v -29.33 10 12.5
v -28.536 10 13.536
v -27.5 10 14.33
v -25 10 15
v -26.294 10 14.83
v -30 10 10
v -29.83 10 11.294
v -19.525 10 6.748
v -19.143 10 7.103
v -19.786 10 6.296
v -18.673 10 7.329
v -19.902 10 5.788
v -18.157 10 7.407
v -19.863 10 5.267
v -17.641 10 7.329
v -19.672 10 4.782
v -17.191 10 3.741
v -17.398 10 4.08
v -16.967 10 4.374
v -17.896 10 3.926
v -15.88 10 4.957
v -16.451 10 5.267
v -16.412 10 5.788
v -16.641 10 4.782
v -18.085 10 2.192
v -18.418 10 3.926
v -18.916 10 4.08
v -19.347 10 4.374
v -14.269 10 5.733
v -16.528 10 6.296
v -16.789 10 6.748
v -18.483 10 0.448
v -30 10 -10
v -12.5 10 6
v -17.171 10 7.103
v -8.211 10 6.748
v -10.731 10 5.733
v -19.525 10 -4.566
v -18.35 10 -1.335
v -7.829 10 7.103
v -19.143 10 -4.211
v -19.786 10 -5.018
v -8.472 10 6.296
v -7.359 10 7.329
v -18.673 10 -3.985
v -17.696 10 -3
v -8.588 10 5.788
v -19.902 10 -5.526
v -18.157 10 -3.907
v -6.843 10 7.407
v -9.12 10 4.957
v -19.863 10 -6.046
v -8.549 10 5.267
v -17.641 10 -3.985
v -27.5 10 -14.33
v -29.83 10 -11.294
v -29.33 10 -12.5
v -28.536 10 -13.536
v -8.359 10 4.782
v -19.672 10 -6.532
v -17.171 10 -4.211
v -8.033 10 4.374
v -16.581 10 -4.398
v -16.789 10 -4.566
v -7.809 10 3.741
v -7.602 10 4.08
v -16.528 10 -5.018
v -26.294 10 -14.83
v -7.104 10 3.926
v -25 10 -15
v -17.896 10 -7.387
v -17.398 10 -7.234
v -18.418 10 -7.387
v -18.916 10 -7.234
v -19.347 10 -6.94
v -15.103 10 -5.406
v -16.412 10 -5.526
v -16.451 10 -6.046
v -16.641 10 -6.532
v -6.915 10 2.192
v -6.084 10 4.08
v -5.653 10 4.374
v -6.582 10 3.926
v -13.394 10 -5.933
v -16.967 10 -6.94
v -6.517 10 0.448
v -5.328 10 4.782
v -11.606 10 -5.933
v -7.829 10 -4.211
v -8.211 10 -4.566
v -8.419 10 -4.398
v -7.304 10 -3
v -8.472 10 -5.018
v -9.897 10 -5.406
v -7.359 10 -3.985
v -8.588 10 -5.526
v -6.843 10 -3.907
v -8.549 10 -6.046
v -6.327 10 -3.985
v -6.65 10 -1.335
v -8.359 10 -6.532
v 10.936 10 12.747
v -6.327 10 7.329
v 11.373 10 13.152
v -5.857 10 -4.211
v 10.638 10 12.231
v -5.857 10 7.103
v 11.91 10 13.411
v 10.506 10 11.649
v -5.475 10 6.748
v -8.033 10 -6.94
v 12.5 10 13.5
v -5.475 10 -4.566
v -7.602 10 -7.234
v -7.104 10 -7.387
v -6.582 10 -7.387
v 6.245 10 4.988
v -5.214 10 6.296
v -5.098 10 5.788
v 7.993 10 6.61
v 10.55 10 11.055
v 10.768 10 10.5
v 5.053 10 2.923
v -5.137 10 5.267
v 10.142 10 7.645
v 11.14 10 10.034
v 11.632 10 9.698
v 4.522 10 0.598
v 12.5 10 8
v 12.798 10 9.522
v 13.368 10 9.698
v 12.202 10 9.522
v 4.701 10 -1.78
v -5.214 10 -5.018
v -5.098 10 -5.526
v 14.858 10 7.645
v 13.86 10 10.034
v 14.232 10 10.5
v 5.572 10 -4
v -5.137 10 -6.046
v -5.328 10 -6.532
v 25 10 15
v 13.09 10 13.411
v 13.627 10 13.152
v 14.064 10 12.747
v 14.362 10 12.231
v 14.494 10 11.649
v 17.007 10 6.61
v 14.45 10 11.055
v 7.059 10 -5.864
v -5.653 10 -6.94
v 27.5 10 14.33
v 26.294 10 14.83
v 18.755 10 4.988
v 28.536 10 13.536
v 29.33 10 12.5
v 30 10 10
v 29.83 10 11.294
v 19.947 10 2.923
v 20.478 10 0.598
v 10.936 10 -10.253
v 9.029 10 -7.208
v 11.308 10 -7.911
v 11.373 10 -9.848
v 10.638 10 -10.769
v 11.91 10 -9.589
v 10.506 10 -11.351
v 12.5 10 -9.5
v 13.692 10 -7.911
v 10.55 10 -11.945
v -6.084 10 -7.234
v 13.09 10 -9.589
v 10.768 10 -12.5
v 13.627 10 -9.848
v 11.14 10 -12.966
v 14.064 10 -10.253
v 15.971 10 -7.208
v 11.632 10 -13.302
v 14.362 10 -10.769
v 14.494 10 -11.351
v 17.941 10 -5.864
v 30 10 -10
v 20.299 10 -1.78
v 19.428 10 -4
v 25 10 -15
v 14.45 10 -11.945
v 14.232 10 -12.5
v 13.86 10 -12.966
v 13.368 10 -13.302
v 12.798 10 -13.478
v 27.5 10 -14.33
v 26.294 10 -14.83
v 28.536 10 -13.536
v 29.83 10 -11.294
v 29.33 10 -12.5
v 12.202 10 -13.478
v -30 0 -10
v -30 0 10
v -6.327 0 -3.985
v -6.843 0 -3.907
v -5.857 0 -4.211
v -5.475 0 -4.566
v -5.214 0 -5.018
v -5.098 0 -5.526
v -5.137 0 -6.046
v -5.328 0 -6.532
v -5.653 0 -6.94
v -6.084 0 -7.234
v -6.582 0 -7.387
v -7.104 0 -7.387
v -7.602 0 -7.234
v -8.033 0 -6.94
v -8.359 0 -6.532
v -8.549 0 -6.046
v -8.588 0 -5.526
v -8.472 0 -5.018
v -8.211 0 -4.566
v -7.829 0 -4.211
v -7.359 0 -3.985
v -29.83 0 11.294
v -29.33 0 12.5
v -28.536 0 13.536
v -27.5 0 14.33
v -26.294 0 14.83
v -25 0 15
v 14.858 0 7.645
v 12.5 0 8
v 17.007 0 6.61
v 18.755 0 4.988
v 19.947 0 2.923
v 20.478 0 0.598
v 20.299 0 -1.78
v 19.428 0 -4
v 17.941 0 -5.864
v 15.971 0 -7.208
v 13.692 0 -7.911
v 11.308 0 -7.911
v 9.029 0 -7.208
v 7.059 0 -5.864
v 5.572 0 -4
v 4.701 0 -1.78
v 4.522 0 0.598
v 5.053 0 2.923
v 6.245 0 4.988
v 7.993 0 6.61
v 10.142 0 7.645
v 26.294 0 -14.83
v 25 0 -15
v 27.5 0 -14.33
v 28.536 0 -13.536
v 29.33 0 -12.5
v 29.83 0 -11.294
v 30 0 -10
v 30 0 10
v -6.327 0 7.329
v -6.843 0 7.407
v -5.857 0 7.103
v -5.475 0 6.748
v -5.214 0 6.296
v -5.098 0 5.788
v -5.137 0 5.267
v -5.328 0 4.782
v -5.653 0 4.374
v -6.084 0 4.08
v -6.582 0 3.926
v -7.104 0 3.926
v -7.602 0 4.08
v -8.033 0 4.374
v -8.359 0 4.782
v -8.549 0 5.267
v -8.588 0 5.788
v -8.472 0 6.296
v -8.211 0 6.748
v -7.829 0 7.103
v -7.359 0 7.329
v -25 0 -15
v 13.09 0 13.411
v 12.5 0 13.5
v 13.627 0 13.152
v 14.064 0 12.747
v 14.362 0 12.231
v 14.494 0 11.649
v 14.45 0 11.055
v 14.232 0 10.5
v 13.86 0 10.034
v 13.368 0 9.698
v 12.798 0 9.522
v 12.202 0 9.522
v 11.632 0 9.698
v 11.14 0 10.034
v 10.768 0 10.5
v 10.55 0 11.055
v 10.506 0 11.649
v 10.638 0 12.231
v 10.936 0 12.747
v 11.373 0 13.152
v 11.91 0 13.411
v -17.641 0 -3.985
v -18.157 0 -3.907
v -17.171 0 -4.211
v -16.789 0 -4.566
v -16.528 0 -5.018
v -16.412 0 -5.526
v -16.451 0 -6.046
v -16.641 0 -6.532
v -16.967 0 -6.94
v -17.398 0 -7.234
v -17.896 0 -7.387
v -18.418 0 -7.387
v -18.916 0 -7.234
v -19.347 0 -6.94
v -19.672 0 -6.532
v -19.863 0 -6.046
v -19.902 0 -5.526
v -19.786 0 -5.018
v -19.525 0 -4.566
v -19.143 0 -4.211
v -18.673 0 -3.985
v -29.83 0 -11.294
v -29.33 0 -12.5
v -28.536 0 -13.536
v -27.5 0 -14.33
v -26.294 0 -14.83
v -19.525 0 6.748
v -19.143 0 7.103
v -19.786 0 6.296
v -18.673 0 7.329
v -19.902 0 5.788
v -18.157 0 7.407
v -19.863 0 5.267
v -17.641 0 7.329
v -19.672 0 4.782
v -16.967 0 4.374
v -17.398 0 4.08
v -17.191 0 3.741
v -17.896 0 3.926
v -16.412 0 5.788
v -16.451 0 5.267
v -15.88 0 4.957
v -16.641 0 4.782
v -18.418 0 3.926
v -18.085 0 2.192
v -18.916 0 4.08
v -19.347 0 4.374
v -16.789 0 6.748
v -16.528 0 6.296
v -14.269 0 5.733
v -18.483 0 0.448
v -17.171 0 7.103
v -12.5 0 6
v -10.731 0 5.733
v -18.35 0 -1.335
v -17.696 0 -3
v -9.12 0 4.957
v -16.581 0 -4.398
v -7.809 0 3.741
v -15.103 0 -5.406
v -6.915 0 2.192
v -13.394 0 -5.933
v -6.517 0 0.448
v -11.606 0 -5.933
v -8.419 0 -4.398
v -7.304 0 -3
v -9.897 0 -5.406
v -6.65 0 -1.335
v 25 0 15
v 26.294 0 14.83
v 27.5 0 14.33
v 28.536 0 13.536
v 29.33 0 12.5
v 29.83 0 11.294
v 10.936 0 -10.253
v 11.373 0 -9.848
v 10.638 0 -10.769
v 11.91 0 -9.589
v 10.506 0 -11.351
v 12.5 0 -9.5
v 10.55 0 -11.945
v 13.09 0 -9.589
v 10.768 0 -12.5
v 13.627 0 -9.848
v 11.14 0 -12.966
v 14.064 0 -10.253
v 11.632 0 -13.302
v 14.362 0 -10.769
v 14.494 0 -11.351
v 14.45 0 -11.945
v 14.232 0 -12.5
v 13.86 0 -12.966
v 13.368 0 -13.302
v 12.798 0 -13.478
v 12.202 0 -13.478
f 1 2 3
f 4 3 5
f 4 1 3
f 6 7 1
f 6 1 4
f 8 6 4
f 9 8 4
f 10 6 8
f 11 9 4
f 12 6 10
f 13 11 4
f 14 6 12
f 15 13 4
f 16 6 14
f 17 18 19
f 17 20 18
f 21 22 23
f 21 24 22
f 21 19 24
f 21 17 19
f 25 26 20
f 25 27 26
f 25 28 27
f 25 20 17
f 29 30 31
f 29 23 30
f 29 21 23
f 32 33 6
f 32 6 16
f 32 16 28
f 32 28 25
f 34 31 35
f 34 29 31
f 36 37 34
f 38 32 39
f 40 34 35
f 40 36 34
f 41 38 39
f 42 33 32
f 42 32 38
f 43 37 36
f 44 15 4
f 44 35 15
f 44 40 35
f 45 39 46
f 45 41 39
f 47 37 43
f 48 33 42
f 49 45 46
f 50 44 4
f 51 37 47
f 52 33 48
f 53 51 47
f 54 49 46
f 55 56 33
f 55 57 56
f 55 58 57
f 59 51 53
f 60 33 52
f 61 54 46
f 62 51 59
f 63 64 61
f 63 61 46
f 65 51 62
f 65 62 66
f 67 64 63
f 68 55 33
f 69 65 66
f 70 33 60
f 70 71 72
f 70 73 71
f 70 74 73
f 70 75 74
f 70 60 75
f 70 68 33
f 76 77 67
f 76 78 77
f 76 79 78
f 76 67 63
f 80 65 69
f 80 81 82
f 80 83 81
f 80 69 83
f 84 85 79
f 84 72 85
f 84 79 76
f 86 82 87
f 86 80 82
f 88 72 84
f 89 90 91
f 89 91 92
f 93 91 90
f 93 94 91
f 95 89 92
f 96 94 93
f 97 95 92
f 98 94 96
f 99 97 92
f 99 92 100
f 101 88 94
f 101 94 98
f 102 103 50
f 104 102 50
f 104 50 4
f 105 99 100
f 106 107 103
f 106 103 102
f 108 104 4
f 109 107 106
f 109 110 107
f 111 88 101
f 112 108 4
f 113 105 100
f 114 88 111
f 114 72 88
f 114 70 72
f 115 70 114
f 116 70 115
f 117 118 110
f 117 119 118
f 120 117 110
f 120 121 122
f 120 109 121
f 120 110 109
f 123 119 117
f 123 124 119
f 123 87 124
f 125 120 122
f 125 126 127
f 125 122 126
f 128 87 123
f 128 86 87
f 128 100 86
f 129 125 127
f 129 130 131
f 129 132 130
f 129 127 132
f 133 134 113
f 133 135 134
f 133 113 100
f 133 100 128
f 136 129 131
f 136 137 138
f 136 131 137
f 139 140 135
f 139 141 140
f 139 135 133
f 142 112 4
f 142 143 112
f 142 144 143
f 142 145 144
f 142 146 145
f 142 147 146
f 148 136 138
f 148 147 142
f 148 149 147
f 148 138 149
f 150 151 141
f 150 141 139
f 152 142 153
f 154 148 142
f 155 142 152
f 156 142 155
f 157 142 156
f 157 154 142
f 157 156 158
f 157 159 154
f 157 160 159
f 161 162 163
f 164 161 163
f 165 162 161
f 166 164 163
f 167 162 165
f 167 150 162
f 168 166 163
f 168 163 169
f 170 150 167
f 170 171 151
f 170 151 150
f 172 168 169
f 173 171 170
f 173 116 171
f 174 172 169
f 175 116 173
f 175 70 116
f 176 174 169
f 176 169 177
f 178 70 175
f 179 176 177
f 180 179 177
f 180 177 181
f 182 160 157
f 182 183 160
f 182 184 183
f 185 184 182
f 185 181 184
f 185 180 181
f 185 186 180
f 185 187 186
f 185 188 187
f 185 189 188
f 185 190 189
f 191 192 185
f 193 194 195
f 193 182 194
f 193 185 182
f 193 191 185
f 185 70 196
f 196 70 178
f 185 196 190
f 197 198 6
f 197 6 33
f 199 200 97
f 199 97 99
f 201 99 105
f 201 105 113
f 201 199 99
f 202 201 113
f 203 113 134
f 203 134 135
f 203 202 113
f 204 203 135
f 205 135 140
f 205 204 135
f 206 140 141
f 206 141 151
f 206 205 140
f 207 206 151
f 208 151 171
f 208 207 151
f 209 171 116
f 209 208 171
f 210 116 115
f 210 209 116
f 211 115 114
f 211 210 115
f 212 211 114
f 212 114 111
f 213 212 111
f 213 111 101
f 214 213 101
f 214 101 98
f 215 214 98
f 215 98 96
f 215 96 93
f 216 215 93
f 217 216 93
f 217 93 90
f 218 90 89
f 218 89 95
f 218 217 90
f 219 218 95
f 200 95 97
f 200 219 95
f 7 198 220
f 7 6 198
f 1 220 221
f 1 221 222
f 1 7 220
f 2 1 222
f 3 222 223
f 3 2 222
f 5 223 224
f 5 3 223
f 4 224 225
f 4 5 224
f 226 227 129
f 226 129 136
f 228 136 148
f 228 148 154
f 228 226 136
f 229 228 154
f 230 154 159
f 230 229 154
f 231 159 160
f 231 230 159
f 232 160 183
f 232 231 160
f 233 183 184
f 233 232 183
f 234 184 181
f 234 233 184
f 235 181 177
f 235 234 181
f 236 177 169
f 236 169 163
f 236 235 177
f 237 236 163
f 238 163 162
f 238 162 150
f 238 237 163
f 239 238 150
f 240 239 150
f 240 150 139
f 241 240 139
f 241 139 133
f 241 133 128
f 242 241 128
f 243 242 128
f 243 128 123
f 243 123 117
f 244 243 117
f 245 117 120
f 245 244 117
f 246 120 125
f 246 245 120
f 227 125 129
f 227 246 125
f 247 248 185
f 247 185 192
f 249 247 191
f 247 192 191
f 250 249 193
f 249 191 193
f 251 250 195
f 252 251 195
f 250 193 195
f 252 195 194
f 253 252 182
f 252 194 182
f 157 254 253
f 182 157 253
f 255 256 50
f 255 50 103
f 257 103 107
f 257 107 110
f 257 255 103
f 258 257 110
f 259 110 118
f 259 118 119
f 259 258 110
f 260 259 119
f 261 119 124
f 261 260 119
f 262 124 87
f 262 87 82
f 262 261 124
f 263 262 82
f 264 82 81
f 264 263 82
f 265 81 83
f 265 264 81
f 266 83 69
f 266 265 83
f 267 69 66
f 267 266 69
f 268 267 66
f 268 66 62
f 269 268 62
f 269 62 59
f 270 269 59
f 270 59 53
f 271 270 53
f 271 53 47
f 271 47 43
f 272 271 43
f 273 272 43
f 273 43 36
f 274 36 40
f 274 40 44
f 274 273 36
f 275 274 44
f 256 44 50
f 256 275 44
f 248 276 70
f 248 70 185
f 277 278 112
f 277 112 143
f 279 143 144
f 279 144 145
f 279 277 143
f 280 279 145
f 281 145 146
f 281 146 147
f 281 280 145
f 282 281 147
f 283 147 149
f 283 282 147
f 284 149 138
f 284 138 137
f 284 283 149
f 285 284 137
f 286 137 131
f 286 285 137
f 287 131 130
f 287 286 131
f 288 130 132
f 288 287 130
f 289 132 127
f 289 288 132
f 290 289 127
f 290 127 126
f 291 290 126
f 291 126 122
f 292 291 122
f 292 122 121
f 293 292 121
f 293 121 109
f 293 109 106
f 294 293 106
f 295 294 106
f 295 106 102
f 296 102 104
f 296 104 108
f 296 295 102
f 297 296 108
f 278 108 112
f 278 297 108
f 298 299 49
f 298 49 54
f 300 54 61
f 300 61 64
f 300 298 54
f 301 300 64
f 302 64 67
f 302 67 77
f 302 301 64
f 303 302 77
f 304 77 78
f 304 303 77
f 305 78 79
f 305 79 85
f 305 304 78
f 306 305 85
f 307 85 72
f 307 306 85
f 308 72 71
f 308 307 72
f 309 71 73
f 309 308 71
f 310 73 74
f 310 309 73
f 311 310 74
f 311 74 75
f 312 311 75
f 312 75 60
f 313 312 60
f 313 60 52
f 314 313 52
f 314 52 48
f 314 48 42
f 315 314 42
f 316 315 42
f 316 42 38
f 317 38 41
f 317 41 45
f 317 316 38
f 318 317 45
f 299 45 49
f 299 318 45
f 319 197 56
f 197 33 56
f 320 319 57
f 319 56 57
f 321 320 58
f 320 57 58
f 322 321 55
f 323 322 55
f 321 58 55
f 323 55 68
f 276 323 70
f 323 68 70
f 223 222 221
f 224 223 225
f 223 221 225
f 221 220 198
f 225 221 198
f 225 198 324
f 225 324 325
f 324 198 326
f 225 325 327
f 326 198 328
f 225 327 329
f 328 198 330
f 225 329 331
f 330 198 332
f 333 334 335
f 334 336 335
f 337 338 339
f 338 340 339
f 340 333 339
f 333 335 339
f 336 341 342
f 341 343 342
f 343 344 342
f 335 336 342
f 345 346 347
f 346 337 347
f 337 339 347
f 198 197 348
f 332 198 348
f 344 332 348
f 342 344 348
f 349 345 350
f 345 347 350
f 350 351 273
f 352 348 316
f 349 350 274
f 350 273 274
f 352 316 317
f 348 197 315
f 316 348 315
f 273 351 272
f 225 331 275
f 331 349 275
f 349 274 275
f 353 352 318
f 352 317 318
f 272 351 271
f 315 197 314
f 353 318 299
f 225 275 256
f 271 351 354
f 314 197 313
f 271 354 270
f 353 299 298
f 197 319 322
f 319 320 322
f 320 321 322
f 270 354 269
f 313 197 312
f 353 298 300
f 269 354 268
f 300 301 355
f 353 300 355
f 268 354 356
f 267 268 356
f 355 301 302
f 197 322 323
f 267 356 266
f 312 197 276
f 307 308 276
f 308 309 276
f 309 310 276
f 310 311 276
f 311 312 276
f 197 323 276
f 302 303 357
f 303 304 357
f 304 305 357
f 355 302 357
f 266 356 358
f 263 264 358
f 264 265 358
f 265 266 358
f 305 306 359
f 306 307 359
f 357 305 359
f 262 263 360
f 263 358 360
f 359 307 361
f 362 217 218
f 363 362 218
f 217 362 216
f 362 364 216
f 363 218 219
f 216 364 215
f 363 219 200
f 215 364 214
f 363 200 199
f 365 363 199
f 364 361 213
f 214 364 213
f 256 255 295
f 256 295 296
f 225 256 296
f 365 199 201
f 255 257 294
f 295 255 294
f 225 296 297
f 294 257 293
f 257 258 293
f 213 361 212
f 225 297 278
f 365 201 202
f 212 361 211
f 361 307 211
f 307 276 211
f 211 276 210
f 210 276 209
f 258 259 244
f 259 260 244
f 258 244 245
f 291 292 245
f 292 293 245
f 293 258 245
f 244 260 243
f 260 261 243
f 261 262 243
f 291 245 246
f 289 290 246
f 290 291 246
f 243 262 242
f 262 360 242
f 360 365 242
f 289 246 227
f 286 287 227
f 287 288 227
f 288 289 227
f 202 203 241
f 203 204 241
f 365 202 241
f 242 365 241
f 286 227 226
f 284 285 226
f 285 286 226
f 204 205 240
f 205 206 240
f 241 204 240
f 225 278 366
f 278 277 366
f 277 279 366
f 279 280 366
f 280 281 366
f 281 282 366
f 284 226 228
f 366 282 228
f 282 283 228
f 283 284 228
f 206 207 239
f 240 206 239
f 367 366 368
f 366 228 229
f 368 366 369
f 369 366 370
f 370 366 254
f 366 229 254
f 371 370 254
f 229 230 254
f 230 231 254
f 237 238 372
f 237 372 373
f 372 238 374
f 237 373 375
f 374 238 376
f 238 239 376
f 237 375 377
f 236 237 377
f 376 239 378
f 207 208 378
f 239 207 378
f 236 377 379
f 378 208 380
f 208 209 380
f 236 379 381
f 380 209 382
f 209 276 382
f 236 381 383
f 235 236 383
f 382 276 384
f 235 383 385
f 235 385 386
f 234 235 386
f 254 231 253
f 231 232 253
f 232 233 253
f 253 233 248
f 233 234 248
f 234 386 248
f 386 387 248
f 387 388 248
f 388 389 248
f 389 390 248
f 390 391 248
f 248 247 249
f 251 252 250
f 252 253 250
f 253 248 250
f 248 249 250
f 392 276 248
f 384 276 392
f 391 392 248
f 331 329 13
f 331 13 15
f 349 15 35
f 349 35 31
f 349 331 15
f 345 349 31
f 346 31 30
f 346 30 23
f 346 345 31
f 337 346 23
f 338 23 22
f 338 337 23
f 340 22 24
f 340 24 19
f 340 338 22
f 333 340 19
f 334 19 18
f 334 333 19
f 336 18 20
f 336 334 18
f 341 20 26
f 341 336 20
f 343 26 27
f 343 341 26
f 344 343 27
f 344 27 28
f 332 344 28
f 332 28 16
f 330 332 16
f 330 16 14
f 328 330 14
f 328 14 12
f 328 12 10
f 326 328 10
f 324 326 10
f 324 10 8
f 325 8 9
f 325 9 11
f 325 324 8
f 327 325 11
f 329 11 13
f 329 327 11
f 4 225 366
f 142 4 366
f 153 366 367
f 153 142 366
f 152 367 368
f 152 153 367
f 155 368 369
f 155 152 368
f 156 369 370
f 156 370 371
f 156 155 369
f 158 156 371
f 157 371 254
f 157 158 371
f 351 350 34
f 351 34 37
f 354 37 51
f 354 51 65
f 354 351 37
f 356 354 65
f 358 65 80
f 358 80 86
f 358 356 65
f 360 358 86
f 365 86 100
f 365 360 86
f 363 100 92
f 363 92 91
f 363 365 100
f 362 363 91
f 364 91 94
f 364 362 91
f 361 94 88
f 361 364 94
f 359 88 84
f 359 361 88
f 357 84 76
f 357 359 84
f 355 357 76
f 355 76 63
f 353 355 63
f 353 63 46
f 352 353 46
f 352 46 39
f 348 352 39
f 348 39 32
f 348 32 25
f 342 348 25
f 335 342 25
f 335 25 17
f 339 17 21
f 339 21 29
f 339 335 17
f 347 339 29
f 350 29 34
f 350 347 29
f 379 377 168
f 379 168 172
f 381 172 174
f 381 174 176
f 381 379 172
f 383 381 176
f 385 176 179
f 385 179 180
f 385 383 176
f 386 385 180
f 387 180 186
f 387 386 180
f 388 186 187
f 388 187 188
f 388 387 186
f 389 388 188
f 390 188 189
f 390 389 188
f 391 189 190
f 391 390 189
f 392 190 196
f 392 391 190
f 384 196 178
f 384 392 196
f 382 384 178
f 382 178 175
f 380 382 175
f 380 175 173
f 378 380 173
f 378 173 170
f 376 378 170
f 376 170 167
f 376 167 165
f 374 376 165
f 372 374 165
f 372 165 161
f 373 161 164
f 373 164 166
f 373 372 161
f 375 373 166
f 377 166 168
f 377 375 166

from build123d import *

# Parameters (mm, degrees)
SKETCH1_W           = 60
SKETCH1_H           = 30
SKETCH1_R           = 8
SKETCH1_R_2         = 6
SKETCH1_R_3         = 1.75
SKETCH1_R_4         = 2
BOSS_EXTRUDE1_DEPTH = 10
FILLET1_R           = 5


with BuildPart() as part:
    # Sketch1 → Boss-Extrude1 (new body)
    with BuildSketch(Plane(origin=(0, 0, 0), x_dir=(1, 0, 0), z_dir=(0, 1, 0))):
        Rectangle(SKETCH1_W, SKETCH1_H)
        with Locations(Location((12.5, 0, 0), (0, 0, 270))):
            Circle(SKETCH1_R, mode=Mode.SUBTRACT)
        with Locations(Location((-12.5, 0, 0), (0, 0, 270))):
            Circle(SKETCH1_R_2, mode=Mode.SUBTRACT)
        with Locations(Location((-18.156854249, 5.656854249, 0), (0, 0, 270))):
            Circle(SKETCH1_R_3, mode=Mode.SUBTRACT)
        with Locations(Location((-6.843145751, 5.656854249, 0), (0, 0, 270))):
            Circle(SKETCH1_R_3, mode=Mode.SUBTRACT)
        with Locations(Location((-6.843145751, -5.656854249, 0), (0, 0, 270))):
            Circle(SKETCH1_R_3, mode=Mode.SUBTRACT)
        with Locations(Location((-18.156854249, -5.656854249, 0), (0, 0, 270))):
            Circle(SKETCH1_R_3, mode=Mode.SUBTRACT)
        with Locations(Location((12.5, -11.5, 0), (0, 0, 270))):
            Circle(SKETCH1_R_4, mode=Mode.SUBTRACT)
        with Locations(Location((12.5, 11.5, 0), (0, 0, 270))):
            Circle(SKETCH1_R_4, mode=Mode.SUBTRACT)
    extrude(amount=BOSS_EXTRUDE1_DEPTH)

    # Fillet1
    fillet1_edges = [part.edges().sort_by_distance(p)[0] for p in [
        (30, 5, 15),
        (-30, 5, 15),
        (-30, 5, -15),
        (30, 5, -15),
    ]]
    fillet(fillet1_edges, radius=FILLET1_R)


solid = part.part
